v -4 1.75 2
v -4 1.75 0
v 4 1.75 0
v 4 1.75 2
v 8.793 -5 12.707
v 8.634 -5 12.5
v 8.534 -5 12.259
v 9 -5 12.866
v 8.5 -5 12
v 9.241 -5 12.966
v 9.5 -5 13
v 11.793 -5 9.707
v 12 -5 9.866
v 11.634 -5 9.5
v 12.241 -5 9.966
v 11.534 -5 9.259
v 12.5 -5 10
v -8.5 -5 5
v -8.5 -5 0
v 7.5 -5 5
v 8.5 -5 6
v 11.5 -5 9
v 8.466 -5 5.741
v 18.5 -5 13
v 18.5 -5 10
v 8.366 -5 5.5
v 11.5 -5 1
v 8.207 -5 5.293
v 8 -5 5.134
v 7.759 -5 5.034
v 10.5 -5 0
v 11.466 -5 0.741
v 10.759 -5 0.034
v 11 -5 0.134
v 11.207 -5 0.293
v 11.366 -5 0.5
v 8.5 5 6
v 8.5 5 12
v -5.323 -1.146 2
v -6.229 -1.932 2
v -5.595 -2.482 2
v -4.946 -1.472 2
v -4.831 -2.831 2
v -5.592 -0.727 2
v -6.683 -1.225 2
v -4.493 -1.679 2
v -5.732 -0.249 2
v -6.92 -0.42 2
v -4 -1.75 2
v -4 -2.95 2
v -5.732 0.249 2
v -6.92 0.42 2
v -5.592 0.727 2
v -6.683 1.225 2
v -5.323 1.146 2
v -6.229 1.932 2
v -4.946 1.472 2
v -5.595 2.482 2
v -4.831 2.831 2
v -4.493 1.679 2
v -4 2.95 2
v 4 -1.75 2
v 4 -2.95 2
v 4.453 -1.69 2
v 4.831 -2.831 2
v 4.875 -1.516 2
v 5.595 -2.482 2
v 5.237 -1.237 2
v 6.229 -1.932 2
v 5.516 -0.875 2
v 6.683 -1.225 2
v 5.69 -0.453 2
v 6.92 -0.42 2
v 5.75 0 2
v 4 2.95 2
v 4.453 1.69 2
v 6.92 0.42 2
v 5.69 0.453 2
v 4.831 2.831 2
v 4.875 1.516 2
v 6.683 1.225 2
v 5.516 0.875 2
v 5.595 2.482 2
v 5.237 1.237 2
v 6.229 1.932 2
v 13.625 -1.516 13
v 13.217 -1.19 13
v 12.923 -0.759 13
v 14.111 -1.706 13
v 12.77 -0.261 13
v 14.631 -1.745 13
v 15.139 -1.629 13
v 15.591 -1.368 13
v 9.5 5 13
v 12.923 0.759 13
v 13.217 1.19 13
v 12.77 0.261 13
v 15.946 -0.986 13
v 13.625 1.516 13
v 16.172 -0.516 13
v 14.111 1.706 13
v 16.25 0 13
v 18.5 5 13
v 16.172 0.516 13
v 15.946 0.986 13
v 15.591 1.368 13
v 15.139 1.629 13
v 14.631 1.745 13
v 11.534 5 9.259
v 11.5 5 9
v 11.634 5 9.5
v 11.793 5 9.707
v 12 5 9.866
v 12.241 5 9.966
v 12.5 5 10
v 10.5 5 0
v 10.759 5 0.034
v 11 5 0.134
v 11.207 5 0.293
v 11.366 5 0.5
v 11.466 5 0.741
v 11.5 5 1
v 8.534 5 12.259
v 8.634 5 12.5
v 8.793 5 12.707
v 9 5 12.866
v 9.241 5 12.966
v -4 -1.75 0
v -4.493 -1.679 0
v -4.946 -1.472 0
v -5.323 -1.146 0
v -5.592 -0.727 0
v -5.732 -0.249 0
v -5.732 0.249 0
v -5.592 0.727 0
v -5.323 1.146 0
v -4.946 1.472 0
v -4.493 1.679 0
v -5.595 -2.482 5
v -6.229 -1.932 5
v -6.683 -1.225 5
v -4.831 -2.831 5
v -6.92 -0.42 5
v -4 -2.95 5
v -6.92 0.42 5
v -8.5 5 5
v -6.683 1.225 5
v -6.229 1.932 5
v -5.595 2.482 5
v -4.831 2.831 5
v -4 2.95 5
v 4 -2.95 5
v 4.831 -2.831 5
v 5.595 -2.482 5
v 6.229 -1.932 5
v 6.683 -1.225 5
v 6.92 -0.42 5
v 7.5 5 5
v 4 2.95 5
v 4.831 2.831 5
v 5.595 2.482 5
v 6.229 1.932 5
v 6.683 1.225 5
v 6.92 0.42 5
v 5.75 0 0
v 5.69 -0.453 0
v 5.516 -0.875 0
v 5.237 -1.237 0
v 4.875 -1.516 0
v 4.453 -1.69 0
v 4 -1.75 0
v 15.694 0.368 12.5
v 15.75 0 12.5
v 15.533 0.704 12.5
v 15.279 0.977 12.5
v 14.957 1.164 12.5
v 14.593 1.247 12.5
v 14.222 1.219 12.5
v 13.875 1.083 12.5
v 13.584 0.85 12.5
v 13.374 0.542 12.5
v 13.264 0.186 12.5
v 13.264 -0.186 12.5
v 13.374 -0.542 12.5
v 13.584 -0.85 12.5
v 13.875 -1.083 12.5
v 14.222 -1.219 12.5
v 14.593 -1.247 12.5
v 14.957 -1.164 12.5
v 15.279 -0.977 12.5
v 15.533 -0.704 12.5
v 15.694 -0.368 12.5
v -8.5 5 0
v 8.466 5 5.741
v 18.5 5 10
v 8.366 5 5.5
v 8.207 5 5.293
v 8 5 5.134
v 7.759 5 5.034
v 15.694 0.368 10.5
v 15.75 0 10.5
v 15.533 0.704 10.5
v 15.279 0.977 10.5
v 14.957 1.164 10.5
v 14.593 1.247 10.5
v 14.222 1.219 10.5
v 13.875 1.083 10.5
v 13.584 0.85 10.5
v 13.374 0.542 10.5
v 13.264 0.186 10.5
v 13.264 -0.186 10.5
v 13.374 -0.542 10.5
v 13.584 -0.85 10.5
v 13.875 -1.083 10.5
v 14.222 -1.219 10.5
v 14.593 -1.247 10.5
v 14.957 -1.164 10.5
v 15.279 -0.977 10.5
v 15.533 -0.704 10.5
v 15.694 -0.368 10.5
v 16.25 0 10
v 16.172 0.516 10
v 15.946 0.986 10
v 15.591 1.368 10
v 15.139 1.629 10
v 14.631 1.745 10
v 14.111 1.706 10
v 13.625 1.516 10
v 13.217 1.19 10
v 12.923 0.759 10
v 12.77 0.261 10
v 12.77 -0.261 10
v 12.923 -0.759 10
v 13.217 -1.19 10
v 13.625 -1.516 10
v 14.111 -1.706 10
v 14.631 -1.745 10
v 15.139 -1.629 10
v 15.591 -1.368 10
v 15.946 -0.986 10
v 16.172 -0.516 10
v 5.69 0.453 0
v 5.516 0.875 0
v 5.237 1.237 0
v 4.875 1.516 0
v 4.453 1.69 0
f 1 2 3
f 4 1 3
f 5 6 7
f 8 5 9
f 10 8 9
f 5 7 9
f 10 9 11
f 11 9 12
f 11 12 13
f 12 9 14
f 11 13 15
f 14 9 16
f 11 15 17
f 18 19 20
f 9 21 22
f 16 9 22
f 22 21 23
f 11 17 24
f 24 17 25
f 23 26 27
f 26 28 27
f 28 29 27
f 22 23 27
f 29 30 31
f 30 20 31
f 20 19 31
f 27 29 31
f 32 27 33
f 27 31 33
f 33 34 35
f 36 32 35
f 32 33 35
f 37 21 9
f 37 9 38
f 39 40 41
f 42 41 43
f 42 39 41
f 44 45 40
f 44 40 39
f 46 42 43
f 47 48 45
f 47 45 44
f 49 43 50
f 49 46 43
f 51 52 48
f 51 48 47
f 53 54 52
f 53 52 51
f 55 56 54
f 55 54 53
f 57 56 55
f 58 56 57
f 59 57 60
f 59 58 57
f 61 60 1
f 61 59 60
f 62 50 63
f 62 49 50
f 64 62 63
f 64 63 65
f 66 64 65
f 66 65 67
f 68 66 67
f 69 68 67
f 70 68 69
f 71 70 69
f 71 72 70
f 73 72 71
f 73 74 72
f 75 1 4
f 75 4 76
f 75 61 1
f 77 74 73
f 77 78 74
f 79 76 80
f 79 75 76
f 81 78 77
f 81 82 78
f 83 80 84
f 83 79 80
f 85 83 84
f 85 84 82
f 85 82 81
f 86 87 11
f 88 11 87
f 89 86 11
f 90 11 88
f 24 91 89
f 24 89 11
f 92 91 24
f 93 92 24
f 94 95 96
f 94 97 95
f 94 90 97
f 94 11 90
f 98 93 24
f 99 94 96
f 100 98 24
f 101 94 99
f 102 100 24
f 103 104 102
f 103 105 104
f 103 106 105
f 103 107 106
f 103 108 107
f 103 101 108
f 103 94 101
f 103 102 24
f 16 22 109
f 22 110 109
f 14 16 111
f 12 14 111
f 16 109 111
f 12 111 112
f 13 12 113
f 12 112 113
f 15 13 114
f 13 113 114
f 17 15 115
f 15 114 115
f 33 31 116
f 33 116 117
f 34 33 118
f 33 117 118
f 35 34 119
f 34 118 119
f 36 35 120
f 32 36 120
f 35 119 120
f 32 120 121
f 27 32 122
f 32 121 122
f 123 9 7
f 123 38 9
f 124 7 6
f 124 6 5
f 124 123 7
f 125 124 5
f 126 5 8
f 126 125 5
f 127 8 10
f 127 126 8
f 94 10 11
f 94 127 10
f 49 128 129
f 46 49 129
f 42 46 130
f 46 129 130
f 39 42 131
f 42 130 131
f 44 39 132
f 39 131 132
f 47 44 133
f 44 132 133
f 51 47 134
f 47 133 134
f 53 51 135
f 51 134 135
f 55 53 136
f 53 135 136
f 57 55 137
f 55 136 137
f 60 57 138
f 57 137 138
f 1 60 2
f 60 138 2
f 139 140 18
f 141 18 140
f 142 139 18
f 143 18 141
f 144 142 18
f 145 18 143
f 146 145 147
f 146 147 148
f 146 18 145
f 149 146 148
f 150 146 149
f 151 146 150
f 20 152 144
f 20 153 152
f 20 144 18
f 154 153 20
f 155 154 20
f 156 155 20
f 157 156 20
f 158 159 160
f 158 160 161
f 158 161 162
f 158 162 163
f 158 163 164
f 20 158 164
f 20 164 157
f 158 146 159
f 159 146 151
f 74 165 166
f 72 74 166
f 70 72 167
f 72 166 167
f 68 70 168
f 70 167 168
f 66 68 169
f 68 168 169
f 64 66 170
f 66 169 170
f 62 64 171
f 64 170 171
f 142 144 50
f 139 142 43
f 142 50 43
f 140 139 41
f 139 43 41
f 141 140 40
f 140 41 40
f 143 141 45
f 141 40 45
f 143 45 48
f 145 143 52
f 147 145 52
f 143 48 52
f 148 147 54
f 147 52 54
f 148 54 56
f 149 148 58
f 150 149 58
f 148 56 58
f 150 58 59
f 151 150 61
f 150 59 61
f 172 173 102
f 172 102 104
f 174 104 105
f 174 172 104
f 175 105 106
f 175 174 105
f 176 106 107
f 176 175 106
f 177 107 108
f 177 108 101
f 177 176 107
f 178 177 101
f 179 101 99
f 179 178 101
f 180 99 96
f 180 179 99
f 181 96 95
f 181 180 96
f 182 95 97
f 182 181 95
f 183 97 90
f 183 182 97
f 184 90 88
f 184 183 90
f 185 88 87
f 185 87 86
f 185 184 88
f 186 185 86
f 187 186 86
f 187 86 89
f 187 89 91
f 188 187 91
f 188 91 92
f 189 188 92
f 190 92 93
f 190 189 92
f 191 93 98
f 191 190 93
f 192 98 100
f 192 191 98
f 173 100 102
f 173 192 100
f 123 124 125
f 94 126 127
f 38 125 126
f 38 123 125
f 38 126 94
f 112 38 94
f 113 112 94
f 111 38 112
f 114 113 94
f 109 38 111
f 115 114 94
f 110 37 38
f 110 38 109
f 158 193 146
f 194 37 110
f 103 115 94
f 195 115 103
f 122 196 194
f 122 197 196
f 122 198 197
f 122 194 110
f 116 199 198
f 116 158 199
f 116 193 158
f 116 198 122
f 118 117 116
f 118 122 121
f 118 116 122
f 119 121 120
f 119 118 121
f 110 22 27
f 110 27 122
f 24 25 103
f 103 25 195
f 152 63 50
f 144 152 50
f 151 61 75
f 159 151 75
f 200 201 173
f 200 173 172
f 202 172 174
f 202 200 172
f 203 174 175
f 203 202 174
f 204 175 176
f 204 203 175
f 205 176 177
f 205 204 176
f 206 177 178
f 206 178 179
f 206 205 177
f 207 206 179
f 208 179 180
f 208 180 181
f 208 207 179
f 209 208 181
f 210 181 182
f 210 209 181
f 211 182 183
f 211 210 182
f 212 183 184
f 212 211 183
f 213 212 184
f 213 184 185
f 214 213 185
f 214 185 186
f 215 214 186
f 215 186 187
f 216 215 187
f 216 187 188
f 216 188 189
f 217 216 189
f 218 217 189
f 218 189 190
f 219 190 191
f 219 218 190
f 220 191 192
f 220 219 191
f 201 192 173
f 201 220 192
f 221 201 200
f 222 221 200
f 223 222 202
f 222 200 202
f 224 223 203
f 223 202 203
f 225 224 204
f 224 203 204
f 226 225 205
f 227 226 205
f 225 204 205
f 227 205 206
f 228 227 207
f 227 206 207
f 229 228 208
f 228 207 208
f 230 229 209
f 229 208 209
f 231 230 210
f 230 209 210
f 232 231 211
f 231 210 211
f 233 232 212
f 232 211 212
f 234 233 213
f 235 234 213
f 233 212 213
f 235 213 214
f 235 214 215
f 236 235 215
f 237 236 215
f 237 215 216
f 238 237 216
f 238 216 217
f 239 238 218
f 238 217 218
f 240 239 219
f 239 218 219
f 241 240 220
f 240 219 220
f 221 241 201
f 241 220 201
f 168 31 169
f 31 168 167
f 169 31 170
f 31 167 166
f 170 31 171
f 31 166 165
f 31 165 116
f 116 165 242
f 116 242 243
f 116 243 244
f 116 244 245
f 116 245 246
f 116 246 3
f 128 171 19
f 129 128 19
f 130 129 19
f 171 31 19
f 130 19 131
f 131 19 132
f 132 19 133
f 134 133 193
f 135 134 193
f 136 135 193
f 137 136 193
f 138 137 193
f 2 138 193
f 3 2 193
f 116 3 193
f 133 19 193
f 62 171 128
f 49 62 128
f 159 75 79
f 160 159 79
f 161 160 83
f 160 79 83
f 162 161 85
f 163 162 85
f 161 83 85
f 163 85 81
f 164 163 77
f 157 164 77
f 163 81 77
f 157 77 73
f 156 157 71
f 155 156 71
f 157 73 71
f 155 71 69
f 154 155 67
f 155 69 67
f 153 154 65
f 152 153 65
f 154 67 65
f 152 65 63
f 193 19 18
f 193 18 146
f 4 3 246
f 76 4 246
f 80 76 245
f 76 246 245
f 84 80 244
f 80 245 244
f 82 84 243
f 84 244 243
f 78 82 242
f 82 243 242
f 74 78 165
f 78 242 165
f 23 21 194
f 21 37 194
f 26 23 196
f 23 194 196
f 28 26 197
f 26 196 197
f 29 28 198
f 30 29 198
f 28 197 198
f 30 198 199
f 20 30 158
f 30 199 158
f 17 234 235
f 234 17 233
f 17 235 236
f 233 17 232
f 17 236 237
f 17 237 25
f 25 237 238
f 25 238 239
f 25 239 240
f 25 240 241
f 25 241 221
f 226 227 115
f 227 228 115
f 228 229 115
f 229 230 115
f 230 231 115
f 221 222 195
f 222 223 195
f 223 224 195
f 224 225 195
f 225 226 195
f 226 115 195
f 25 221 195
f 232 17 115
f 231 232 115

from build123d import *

# Parameters (mm, degrees)
F0_W     = 17
F0_H     = 10
F1_DEPTH = 5
F2_DEPTH = 2
F3_W     = 10
F3_H     = 10
F4_DEPTH = 3
F5_W     = 10
F5_H     = 10
F5_R     = 1.25
F6_DEPTH = 3
F7_R     = 1
F8_SIZE  = 0.5


with BuildPart() as f1:
    # F0 (on Top) → F1 (new body)
    with BuildSketch(Plane.XY):
        Rectangle(F0_W, F0_H)
        with BuildLine():
            ThreePointArc((-4, -2.95), (-6.95, 0), (-4, 2.95))
            Line((-4, 2.95), (4, 2.95))
            ThreePointArc((4, 2.95), (6.0859650045, 2.0859650045), (6.95, 0))
            ThreePointArc((6.95, 0), (6.0859650045, -2.0859650045), (4, -2.95))
            Line((4, -2.95), (-4, -2.95))
        make_face(mode=Mode.SUBTRACT)
    extrude(amount=F1_DEPTH)

    # F0 (on Top) → F2 (join)
    with BuildSketch(Plane.XY):
        with BuildLine():
            ThreePointArc((-4, -1.75), (-5.75, 0), (-4, 1.75))
            Line((-4, 1.75), (-4, 2.95))
            ThreePointArc((-4, 2.95), (-6.95, 0), (-4, -2.95))
            Line((-4, -2.95), (-4, -1.75))
        make_face()
        with BuildLine():
            Line((-4, 2.95), (-4, 1.75))
            Line((-4, 1.75), (-1.6251315826, 1.75))
            ThreePointArc((-1.6251315826, 1.75), (-2.6695865304, 2.6329641091), (-4, 2.95))
        make_face()
        with BuildLine():
            ThreePointArc((-4, 2.95), (-2.6695865304, 2.6329641091), (-1.6251315826, 1.75))
            Line((-1.6251315826, 1.75), (1.6251315826, 1.75))
            ThreePointArc((1.6251315826, 1.75), (2.6695865304, 2.6329641091), (4, 2.95))
            Line((4, 2.95), (-4, 2.95))
        make_face()
        with BuildLine():
            ThreePointArc((4, 2.95), (2.6695865304, 2.6329641091), (1.6251315826, 1.75))
            Line((1.6251315826, 1.75), (4, 1.75))
            Line((4, 1.75), (4, 2.95))
        make_face()
        with BuildLine():
            ThreePointArc((6.95, 0), (6.0859650045, 2.0859650045), (4, 2.95))
            Line((4, 2.95), (4, 1.75))
            ThreePointArc((4, 1.75), (5.2374368671, 1.2374368671), (5.75, 0))
            ThreePointArc((5.75, 0), (5.2374368671, -1.2374368671), (4, -1.75))
            Line((4, -1.75), (4, -2.95))
            ThreePointArc((4, -2.95), (6.0859650045, -2.0859650045), (6.95, 0))
        make_face()
        with BuildLine():
            Line((4, -1.75), (1.6251315826, -1.75))
            ThreePointArc((1.6251315826, -1.75), (2.6695865304, -2.6329641091), (4, -2.95))
            Line((4, -2.95), (4, -1.75))
        make_face()
        with BuildLine():
            Line((1.6251315826, -1.75), (-1.6251315826, -1.75))
            ThreePointArc((-1.6251315826, -1.75), (-2.6695865304, -2.6329641091), (-4, -2.95))
            Line((-4, -2.95), (4, -2.95))
            ThreePointArc((4, -2.95), (2.6695865304, -2.6329641091), (1.6251315826, -1.75))
        make_face()
        with BuildLine():
            Line((-1.6251315826, -1.75), (-4, -1.75))
            Line((-4, -1.75), (-4, -2.95))
            ThreePointArc((-4, -2.95), (-2.6695865304, -2.6329641091), (-1.6251315826, -1.75))
        make_face()
    extrude(amount=F2_DEPTH)

    # F3 (on face) → F4 (join)
    with BuildSketch(Plane.YZ.offset(8.5)):
        with Locations((0, 5)):
            Rectangle(F3_W, F3_H)
    extrude(amount=F4_DEPTH)

    # F5 (on face) → F6 (join)
    with BuildSketch(Plane.XY.offset(10)):
        with Locations((13.5, 0)):
            Rectangle(F5_W, F5_H)
        with Locations((14.5, 0)):
            Circle(F5_R, mode=Mode.SUBTRACT)
    extrude(amount=F6_DEPTH)

    # F7
    f7_edges = [f1.edges().sort_by_distance(p)[0] for p in [
        (8.5, 0, 13),
        (11.5, 0, 10),
        (11.5, 0, 0),
        (8.5, 0, 5),
    ]]
    fillet(f7_edges, radius=F7_R)

    # F8
    f8_edges = [f1.edges().sort_by_distance(p)[0] for p in [
        (15.75, 0, 11.5),
        (13.25, 0, 10),
        (13.25, 0, 13),
    ]]
    chamfer(f8_edges, length=F8_SIZE)


solid = f1.part
